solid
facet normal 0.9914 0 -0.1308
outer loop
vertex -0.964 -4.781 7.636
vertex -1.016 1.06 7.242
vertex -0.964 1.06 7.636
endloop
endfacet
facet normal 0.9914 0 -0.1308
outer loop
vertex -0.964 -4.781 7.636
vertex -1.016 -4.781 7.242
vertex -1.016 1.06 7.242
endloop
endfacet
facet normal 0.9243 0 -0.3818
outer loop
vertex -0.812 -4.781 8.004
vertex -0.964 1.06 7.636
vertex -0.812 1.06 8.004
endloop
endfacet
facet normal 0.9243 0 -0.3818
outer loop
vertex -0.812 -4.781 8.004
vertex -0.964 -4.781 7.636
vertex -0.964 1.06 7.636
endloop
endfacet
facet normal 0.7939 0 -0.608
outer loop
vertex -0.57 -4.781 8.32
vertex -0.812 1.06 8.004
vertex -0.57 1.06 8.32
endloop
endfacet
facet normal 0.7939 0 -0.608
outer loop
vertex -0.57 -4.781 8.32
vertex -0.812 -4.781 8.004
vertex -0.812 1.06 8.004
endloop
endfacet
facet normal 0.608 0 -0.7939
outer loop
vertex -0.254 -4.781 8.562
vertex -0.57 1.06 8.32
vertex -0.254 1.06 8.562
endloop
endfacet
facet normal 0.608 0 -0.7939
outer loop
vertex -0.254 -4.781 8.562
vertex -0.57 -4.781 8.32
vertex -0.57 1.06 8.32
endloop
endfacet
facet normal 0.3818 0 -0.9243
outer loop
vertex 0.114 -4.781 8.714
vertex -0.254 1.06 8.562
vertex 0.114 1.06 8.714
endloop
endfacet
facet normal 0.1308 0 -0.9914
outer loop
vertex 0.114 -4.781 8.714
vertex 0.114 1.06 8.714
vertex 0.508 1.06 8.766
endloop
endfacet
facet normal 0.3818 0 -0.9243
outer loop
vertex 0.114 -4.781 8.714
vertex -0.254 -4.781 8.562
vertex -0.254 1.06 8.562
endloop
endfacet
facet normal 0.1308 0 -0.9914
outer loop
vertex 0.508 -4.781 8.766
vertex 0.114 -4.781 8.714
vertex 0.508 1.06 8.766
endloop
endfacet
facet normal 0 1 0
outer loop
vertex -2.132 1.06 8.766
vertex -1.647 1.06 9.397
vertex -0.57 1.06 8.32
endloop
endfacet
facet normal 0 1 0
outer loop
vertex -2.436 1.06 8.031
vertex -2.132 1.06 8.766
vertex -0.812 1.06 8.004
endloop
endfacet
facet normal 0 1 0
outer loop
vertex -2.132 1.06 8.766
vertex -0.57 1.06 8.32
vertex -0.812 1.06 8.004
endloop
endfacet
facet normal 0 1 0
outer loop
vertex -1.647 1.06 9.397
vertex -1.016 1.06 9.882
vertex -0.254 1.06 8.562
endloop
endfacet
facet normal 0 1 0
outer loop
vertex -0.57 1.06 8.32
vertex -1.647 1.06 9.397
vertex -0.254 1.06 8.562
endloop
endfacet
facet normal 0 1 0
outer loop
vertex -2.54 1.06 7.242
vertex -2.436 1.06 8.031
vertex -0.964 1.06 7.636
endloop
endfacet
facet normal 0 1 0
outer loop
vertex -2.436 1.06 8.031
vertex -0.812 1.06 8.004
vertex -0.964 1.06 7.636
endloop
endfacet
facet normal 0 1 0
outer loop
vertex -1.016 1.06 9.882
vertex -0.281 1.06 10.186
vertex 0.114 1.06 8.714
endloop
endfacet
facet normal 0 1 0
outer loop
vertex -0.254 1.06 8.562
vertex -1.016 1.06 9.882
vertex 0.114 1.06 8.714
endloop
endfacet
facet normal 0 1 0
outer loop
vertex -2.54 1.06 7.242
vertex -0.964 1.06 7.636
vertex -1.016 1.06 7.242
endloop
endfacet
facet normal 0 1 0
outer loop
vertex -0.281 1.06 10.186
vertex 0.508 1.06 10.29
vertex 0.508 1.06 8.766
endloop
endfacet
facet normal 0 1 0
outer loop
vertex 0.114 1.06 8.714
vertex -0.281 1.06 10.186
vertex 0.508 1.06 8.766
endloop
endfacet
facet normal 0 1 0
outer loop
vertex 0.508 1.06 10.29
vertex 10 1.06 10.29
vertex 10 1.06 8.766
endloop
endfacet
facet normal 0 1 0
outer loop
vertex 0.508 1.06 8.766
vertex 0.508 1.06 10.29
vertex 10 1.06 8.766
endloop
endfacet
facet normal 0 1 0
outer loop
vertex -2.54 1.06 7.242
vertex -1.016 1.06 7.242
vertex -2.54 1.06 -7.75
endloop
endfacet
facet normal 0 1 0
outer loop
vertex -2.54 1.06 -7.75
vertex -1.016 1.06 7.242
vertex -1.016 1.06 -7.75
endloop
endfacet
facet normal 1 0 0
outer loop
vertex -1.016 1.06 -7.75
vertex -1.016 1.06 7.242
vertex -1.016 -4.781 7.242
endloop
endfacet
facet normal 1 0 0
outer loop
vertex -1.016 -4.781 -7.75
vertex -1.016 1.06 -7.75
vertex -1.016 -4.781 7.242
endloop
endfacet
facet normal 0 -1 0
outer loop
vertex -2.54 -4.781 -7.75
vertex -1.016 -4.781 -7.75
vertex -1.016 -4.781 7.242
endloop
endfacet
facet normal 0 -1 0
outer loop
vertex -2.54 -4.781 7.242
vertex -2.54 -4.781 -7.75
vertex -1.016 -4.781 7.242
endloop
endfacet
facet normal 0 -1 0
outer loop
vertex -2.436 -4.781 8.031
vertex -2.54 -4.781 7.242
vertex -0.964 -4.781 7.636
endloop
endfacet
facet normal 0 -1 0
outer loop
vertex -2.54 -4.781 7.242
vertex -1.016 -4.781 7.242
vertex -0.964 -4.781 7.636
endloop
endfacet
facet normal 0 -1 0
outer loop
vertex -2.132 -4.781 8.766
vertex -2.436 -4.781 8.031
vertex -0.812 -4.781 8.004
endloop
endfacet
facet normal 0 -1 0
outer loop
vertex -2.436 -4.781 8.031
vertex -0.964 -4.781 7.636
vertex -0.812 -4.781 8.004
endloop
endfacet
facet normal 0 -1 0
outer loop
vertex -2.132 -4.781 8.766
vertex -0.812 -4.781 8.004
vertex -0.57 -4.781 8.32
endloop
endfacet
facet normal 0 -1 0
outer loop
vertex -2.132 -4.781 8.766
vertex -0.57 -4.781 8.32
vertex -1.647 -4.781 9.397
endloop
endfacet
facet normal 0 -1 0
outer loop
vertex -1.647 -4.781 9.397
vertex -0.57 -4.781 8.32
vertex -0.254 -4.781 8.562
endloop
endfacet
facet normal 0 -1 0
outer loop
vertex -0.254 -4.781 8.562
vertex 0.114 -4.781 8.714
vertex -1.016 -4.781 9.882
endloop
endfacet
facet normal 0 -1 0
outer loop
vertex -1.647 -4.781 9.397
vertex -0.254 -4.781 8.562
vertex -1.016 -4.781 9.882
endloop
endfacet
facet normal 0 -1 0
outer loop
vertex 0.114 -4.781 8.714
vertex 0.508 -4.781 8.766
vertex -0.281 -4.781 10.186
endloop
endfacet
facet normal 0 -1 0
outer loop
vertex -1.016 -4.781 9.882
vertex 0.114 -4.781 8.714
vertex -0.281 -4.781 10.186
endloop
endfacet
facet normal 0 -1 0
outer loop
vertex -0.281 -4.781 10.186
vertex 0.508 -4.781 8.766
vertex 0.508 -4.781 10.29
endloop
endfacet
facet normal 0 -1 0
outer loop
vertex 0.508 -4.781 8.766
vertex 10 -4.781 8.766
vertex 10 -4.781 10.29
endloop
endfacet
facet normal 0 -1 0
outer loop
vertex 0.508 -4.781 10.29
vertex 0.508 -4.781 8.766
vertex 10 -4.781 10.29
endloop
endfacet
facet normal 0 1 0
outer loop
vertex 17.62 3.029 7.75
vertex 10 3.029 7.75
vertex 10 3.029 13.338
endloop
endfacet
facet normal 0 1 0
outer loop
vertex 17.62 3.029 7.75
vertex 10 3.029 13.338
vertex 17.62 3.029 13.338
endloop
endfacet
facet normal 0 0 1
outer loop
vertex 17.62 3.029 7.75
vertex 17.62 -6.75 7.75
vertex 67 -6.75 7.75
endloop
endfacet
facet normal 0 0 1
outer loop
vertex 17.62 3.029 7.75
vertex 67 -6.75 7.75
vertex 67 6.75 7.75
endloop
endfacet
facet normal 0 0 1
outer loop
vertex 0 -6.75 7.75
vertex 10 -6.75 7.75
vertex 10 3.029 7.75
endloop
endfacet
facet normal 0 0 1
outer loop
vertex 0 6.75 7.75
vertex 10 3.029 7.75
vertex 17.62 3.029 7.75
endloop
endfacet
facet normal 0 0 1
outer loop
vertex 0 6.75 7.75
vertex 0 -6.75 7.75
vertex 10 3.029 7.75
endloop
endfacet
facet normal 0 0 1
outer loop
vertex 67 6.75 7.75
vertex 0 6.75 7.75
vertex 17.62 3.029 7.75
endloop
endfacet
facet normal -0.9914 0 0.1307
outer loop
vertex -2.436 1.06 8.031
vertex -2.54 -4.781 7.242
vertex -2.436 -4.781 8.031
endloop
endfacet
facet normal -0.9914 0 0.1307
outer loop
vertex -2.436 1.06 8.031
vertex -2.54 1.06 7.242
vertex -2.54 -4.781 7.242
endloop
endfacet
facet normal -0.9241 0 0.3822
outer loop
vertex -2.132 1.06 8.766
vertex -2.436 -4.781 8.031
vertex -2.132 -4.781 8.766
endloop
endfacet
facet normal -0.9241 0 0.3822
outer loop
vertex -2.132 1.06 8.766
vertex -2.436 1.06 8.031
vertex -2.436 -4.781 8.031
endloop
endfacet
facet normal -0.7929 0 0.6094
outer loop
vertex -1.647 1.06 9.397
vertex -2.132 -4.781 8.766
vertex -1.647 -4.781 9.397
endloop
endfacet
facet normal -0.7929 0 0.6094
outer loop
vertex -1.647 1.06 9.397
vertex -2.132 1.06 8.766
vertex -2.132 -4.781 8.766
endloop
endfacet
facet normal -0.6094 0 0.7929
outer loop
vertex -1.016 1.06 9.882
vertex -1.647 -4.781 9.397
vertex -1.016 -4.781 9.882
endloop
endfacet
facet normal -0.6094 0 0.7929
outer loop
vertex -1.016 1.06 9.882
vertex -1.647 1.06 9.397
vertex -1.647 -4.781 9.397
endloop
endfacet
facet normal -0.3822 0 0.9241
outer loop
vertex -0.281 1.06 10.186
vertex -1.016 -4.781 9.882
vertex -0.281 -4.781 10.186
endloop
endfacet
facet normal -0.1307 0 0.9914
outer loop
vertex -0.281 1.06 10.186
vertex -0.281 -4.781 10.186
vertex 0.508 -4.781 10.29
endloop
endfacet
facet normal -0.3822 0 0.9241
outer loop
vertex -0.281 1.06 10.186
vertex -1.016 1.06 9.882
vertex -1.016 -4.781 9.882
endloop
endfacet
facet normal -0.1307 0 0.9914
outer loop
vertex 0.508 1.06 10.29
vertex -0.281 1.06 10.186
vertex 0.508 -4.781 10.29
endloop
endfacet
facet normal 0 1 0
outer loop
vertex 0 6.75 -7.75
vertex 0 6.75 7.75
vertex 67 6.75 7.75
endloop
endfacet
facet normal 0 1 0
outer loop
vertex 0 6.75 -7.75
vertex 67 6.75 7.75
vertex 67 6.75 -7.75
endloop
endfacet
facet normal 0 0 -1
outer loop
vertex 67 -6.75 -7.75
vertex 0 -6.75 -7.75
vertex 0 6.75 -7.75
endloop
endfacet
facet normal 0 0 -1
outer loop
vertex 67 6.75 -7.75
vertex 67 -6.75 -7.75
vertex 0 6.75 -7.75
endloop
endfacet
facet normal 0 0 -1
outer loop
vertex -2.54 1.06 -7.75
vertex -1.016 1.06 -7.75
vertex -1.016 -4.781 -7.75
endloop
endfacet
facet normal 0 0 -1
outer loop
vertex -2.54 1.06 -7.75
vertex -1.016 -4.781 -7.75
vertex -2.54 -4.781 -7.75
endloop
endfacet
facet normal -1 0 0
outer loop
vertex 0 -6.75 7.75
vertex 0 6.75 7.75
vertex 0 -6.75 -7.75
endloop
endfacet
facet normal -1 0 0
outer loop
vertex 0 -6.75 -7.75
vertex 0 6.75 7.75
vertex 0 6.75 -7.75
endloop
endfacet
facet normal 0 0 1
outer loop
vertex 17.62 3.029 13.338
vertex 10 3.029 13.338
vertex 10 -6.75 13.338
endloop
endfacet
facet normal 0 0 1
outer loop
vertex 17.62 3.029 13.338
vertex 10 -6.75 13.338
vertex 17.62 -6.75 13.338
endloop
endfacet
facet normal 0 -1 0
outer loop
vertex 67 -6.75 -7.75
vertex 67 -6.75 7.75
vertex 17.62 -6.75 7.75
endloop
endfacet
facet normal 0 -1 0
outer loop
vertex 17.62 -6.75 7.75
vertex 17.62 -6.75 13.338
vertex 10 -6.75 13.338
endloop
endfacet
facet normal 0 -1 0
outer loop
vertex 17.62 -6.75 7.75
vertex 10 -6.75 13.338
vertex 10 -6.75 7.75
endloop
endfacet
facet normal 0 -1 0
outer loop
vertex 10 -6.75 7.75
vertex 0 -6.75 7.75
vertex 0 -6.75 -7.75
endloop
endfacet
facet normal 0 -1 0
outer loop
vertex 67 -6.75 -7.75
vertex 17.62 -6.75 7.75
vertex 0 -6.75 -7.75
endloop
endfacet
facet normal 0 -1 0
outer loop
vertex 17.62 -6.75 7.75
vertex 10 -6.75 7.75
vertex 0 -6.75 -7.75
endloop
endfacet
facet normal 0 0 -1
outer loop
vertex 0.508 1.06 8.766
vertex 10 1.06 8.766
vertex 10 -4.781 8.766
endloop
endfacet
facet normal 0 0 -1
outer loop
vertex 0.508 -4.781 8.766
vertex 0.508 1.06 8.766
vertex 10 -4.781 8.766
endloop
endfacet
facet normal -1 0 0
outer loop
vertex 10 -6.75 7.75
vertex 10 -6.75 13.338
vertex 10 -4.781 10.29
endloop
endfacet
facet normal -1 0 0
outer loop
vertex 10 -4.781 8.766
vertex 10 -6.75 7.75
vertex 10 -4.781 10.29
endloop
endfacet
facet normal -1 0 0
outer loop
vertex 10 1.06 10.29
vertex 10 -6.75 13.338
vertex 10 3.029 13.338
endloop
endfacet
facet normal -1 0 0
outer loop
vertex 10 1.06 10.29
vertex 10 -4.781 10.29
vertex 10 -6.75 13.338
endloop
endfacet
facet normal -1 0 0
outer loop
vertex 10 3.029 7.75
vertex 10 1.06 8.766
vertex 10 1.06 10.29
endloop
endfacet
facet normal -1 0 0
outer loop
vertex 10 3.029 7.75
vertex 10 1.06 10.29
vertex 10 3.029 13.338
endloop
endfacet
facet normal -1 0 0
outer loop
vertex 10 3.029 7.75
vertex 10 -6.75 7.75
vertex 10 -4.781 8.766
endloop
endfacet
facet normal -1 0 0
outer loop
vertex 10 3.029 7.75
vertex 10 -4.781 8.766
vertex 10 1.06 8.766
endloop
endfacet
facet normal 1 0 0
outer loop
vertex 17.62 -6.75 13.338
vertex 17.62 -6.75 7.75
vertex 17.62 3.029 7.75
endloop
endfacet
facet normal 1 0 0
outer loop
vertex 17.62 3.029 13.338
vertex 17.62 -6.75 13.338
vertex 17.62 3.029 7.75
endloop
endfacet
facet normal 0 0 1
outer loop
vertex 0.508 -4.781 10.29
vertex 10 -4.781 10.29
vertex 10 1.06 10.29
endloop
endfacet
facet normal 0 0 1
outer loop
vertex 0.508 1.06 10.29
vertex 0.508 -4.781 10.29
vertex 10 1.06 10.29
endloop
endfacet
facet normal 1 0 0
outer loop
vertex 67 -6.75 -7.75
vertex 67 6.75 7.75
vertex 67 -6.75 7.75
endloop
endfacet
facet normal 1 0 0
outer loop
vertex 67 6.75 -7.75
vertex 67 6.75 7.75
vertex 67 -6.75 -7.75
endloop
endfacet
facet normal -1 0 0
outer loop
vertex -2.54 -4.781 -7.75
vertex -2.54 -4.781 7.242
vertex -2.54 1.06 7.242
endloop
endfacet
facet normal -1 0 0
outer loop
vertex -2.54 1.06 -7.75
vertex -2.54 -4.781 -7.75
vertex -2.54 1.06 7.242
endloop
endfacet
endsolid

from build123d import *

# Parameters (mm, degrees)
SKETCH1_W           = 15.5
SKETCH1_H           = 13.5
BOSS_EXTRUDE1_DEPTH = 67
SKETCH2_W           = 7.62
SKETCH2_H           = 9.779
BOSS_EXTRUDE2_DEPTH = 5.588
SKETCH4_W           = 1.524
SKETCH4_H           = 5.842


with BuildPart() as part:
    # Sketch1 → Boss-Extrude1 (new body)
    with BuildSketch(Plane(origin=(0, 0, 0), x_dir=(0, 0, -1), z_dir=(1, 0, 0))):
        Rectangle(SKETCH1_W, SKETCH1_H)
    extrude(amount=BOSS_EXTRUDE1_DEPTH)

    # Sketch2 → Boss-Extrude2 (add)
    with BuildSketch(Plane.XY.offset(7.75)):
        with Locations((13.81, -1.8605)):
            Rectangle(SKETCH2_W, SKETCH2_H)
    extrude(amount=BOSS_EXTRUDE2_DEPTH)

    # Sweep1: sweep along a path in Sketch3
    with BuildLine(Plane(origin=(0, 0, 0), x_dir=(1, 0, 0), z_dir=(0, 1, 0))) as sweep1_path:
        Line((-0.762, 7.75), (-0.762, -7.242))
        ThreePointArc((-0.762, -7.242), (-0.390025612, -8.140025612), (0.508, -8.512))
        Line((0.508, -8.512), (10, -8.512))
    # Sketch4 → Sweep1 (sweep)
    with BuildSketch(Plane.ZY.offset(-10)):
        with Locations((9.528, -1.8605)):
            Rectangle(SKETCH4_W, SKETCH4_H)
    sweep(path=sweep1_path.line)


solid = part.part
